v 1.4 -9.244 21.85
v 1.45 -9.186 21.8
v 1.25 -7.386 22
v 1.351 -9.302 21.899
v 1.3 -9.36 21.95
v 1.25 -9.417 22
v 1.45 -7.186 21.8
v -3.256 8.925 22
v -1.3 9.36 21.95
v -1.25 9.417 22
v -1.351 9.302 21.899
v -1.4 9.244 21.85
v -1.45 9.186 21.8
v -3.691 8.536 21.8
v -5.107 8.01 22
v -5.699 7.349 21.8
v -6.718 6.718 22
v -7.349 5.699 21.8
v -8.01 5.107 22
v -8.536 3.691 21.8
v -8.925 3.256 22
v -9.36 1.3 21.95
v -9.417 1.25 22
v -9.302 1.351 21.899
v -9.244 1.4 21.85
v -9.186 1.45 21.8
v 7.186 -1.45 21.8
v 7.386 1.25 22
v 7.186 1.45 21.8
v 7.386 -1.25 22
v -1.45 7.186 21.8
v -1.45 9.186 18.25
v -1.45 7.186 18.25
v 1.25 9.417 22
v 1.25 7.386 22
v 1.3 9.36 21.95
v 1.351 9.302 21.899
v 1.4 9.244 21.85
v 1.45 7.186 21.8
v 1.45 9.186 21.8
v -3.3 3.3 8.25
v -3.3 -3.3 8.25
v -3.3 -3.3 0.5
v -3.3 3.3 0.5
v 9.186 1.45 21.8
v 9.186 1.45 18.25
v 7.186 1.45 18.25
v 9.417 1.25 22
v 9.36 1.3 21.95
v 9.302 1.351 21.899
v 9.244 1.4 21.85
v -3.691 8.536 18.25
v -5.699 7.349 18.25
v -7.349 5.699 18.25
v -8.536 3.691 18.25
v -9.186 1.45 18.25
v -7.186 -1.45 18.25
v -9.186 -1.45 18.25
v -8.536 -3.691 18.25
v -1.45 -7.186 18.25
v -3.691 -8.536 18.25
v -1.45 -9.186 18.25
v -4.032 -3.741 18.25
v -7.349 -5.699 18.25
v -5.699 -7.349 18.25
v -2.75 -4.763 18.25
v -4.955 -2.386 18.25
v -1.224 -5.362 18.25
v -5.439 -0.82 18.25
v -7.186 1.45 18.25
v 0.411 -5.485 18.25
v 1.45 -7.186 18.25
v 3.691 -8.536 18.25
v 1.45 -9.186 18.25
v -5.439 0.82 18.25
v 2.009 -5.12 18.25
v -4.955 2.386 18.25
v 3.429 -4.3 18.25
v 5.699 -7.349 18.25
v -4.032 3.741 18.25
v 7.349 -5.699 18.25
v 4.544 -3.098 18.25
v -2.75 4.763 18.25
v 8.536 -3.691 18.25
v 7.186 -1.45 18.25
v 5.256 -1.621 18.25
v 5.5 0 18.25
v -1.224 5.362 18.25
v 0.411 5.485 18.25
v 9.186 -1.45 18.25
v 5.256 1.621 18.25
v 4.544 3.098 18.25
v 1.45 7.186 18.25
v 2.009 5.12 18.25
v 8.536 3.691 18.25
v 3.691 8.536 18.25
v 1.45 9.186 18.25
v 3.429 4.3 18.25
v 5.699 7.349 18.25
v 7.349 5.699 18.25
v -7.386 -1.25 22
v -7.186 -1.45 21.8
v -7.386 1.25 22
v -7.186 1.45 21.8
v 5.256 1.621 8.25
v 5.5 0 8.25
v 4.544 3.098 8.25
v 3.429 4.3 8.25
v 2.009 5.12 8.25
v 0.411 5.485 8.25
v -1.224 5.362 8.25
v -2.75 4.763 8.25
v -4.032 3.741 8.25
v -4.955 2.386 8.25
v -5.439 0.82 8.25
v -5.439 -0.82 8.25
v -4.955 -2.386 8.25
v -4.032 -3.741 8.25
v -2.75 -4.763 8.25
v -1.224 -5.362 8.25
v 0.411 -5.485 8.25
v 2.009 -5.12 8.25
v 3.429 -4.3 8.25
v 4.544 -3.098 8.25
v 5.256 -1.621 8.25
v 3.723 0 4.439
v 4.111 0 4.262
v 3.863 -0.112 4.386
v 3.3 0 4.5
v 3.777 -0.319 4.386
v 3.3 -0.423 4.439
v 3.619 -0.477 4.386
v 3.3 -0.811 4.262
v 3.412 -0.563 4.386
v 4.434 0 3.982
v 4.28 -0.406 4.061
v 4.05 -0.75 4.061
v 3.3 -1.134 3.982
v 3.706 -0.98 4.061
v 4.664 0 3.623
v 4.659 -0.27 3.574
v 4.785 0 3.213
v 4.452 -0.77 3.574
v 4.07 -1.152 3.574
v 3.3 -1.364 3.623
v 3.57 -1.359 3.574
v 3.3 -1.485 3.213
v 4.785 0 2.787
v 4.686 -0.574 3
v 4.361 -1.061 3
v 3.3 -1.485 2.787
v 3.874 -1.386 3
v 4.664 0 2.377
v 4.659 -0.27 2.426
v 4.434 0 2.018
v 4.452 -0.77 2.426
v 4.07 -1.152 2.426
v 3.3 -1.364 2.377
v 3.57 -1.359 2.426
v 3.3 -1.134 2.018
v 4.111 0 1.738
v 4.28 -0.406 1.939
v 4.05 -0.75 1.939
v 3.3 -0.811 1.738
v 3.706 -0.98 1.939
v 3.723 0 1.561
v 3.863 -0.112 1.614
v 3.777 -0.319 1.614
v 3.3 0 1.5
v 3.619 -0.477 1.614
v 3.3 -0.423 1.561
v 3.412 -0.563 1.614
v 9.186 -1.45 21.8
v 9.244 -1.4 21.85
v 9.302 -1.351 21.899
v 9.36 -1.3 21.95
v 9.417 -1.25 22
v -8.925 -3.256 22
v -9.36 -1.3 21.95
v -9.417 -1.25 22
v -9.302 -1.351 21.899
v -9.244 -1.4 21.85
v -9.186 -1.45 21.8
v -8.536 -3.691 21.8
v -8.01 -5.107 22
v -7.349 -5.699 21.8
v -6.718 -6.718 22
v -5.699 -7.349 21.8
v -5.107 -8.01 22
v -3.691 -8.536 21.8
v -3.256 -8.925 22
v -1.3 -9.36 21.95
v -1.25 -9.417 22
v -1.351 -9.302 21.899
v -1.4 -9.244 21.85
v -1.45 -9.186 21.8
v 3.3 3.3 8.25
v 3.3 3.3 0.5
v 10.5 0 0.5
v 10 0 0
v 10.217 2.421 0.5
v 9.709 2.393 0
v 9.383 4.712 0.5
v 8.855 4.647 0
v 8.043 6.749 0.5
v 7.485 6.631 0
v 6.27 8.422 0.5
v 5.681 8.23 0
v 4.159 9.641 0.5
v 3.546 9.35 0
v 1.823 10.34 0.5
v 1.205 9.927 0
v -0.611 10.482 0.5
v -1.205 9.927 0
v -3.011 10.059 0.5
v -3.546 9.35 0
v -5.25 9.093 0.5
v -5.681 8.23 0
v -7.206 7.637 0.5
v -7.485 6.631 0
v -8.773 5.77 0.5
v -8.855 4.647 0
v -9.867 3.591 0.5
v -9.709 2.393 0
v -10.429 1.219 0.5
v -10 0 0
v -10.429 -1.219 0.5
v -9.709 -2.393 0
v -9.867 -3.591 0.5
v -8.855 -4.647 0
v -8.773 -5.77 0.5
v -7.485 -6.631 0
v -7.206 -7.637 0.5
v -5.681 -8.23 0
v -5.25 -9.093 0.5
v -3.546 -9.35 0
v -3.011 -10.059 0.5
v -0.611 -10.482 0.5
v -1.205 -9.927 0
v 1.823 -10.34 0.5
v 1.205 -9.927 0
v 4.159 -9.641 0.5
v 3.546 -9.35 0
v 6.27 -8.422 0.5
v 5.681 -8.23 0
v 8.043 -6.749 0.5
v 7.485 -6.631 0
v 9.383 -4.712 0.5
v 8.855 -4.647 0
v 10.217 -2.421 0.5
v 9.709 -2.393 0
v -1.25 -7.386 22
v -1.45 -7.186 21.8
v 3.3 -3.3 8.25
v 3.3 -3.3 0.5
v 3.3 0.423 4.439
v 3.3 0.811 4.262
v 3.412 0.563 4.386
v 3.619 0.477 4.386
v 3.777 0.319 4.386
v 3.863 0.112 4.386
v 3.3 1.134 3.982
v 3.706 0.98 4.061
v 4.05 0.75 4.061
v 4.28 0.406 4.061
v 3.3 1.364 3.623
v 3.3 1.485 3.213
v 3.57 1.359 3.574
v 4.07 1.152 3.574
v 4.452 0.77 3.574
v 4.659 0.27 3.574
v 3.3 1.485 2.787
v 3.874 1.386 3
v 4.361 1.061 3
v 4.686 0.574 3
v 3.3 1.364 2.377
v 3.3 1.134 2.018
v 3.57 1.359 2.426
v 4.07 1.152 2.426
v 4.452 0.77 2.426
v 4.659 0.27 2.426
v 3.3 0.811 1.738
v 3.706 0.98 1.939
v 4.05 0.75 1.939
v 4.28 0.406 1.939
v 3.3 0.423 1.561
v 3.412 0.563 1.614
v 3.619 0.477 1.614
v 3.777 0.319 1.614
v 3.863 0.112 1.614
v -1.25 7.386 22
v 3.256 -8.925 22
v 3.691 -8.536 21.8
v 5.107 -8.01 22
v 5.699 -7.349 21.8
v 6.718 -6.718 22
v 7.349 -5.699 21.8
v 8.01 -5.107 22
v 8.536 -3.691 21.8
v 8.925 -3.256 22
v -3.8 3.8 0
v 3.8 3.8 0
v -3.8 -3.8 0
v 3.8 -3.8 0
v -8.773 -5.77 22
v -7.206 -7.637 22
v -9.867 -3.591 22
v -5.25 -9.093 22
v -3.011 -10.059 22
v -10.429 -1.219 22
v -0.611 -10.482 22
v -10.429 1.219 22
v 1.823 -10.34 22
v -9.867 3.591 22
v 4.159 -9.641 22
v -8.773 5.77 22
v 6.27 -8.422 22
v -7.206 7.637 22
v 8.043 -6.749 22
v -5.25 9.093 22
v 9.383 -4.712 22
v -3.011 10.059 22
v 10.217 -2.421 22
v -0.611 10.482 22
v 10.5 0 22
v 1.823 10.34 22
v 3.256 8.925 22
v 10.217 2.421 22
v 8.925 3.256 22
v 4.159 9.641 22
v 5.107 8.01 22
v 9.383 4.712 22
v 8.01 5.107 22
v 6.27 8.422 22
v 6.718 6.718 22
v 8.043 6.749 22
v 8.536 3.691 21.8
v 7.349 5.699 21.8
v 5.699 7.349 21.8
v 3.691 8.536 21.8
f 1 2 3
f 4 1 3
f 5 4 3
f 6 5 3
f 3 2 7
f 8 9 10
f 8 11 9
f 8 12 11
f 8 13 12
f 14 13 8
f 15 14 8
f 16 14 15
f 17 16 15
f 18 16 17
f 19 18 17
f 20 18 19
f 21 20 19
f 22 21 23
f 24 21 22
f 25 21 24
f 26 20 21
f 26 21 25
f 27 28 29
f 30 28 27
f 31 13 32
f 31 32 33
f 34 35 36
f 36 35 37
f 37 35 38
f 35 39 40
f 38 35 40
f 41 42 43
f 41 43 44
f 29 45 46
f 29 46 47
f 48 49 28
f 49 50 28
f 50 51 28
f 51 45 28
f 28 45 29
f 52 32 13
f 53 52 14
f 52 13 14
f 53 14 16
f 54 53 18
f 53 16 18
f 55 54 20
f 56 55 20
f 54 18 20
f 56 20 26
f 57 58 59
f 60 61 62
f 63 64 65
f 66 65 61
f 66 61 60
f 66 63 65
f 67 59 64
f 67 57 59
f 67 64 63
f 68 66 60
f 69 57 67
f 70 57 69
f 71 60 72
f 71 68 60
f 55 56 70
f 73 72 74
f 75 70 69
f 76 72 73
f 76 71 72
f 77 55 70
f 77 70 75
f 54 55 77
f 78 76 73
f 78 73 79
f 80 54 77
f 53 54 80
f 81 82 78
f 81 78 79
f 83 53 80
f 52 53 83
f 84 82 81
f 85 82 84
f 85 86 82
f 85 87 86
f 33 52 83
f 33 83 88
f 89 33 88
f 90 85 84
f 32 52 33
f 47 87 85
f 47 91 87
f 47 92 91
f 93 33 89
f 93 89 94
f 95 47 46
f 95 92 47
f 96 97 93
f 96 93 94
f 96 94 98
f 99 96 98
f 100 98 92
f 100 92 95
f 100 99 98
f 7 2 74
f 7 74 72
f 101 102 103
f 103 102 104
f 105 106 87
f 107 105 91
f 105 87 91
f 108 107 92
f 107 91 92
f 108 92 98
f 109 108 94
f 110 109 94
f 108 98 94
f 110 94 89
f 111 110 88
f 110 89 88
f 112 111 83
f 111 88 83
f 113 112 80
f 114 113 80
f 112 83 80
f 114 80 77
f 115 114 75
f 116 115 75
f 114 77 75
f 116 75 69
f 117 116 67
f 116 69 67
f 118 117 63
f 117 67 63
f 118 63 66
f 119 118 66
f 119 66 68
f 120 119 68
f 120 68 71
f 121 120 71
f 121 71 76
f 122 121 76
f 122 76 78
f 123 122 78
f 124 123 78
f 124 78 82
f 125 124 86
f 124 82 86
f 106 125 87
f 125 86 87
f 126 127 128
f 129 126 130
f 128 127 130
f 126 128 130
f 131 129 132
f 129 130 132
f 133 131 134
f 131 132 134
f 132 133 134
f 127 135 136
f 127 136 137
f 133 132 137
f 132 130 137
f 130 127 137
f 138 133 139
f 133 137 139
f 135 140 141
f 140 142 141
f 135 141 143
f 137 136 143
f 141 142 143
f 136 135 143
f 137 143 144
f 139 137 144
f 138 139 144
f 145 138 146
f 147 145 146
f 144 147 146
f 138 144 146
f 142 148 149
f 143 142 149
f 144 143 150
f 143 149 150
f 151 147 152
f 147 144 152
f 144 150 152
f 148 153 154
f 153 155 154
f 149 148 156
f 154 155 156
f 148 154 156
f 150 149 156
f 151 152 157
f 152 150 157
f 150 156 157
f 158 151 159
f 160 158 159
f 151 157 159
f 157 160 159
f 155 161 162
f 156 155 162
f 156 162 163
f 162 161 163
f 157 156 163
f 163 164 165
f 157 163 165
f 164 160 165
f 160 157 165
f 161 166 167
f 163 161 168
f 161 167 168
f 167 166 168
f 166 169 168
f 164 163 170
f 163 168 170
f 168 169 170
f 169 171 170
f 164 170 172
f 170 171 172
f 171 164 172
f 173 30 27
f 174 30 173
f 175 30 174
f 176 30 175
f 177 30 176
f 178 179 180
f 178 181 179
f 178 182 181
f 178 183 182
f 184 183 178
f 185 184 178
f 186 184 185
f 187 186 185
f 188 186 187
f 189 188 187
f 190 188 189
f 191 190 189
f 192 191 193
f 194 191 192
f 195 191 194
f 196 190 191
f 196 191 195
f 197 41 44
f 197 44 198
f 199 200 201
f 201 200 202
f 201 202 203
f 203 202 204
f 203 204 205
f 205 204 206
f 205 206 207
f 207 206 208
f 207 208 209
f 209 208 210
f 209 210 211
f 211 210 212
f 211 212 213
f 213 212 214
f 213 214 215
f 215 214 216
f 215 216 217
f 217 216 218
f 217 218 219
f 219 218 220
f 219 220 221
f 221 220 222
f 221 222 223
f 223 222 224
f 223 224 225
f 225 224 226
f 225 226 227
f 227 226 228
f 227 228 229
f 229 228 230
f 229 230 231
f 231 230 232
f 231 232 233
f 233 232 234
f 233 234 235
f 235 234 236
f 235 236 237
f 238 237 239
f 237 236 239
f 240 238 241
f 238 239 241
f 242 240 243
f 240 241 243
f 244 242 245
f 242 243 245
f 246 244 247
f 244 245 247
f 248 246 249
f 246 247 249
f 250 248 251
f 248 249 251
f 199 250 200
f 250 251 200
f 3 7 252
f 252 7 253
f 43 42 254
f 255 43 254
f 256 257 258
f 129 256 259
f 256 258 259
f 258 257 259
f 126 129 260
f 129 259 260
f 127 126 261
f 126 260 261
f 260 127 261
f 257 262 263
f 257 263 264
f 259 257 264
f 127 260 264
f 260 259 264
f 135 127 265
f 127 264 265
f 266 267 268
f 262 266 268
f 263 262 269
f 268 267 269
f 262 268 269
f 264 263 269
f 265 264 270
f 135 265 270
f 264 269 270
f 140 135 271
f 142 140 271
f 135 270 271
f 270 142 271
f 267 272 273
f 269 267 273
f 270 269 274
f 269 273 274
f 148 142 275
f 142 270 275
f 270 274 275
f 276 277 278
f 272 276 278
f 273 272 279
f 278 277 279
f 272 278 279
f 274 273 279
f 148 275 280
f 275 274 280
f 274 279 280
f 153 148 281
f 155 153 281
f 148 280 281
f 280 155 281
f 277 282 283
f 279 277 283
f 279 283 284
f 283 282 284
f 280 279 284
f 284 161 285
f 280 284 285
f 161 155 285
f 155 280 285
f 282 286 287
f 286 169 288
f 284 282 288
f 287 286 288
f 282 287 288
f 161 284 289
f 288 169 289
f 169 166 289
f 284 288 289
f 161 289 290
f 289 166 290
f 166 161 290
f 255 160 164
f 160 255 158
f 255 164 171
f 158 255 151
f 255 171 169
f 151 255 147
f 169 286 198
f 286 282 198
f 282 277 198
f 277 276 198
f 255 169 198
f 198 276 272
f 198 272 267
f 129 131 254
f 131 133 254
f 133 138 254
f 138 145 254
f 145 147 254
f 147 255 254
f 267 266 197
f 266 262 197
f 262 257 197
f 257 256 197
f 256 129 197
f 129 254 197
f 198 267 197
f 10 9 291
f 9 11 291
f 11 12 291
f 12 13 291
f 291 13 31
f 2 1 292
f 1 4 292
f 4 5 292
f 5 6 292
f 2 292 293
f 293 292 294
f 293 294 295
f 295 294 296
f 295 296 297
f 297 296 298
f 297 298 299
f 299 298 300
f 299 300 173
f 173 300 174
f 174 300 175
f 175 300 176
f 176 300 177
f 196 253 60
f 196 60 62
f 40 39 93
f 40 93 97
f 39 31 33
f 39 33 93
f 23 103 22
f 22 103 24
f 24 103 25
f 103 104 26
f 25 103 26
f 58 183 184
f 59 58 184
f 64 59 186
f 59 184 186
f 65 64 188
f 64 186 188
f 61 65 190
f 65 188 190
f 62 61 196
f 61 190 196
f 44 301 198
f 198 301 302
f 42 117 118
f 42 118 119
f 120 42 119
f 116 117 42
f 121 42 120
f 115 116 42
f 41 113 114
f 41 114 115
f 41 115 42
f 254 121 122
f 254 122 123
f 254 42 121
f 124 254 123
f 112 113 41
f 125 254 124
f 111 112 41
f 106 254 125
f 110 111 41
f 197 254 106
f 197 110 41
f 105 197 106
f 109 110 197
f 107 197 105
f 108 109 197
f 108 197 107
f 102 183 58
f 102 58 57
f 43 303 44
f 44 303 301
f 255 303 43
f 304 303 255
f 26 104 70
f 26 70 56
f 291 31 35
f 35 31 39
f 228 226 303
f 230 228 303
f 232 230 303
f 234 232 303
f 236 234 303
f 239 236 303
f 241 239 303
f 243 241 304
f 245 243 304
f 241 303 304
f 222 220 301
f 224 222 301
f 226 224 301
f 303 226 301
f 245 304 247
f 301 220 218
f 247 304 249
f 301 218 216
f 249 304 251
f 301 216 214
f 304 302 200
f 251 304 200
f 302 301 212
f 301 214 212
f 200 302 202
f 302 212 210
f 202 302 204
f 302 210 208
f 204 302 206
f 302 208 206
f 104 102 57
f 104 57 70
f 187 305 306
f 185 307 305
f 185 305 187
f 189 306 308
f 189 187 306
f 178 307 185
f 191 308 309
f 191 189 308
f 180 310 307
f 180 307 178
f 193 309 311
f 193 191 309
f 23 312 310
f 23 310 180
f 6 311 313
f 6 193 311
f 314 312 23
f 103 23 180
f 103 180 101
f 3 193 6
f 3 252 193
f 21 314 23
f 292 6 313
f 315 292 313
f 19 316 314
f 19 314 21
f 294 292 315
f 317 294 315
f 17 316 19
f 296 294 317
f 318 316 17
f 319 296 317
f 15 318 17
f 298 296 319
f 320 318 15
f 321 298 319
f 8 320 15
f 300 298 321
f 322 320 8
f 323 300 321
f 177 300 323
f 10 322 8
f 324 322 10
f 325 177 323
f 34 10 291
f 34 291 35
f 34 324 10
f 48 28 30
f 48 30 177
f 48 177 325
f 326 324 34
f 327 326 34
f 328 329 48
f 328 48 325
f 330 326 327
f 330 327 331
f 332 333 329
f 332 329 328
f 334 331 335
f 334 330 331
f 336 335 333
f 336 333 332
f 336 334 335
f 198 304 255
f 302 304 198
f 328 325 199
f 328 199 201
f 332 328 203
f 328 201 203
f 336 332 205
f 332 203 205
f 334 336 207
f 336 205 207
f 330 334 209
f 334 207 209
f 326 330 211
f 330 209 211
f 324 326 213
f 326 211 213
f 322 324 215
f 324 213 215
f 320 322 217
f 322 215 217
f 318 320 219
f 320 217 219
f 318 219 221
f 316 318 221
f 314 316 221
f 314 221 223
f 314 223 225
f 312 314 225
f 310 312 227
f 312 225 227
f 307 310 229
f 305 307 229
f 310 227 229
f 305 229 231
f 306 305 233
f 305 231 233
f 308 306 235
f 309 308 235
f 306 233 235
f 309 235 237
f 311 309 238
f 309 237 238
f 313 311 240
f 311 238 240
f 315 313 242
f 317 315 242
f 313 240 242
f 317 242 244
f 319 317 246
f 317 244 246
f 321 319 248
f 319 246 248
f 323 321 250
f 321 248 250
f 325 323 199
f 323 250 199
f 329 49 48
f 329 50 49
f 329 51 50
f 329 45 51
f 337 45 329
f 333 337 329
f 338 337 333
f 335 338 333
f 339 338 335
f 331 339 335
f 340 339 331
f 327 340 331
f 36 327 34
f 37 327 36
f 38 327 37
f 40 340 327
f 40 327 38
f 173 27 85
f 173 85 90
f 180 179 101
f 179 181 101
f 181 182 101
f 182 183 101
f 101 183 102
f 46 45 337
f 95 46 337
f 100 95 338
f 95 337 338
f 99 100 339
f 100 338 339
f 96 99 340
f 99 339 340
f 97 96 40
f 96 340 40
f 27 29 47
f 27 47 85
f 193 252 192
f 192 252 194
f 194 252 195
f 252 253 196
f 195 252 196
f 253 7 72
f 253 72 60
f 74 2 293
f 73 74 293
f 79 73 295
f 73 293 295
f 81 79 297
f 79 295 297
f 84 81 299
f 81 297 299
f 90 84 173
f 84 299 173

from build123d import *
from build123d.topology import SkipClean

# Parameters (mm, degrees)
SKETCH1_R           = 10.5
BOSS_EXTRUDE1_DEPTH = 22
SKETCH2_R           = 9.3
CUT_EXTRUDE1_DEPTH  = 3.75
BOSS_EXTRUDE3_START = 3.75
BOSS_EXTRUDE3_DEPTH = 3.75
CHAMFER1_SIZE       = 0.2
SKETCH4_W           = 6.6
SKETCH4_H           = 6.6
CUT_EXTRUDE2_DEPTH  = 24.527908959
CHAMFER2_SIZE       = 0.5
SKETCH6_R           = 5.5
CUT_EXTRUDE3_DEPTH  = 10


with BuildPart() as part:
    # Sketch1 → Boss-Extrude1 (new body)
    with BuildSketch(Plane.XY):
        Circle(SKETCH1_R)
    extrude(amount=BOSS_EXTRUDE1_DEPTH)

    # Sketch2 → Cut-Extrude1 (cut)
    with BuildSketch(Plane.XY.offset(22)):
        Circle(SKETCH2_R)
    extrude(amount=-CUT_EXTRUDE1_DEPTH, mode=Mode.SUBTRACT)

    # Sketch3 → Boss-Extrude3 (add)
    with BuildSketch(Plane.XY.offset(18.25).offset(BOSS_EXTRUDE3_START)):
        with BuildLine():
            Line((-1.45, 9.186266924), (-1.45, 7.186266924))
            Line((-1.45, 7.186266924), (1.45, 7.186266924))
            Line((1.45, 7.186266924), (1.45, 9.186266924))
            ThreePointArc((1.45, 9.186266924), (0, 9.3), (-1.45, 9.186266924))
        make_face()
        with BuildLine():
            Line((7.186266924, -1.45), (9.186266924, -1.45))
            ThreePointArc((9.186266924, -1.45), (9.3, 0), (9.186266924, 1.45))
            Line((9.186266924, 1.45), (7.186266924, 1.45))
            Line((7.186266924, 1.45), (7.186266924, -1.45))
        make_face()
        with BuildLine():
            Line((-1.45, -7.186266924), (-1.45, -9.186266924))
            ThreePointArc((-1.45, -9.186266924), (0, -9.3), (1.45, -9.186266924))
            Line((1.45, -9.186266924), (1.45, -7.186266924))
            Line((1.45, -7.186266924), (-1.45, -7.186266924))
        make_face()
        with BuildLine():
            Line((-7.186266924, 1.45), (-9.186266924, 1.45))
            ThreePointArc((-9.186266924, 1.45), (-9.3, 0), (-9.186266924, -1.45))
            Line((-9.186266924, -1.45), (-7.186266924, -1.45))
            Line((-7.186266924, -1.45), (-7.186266924, 1.45))
        make_face()
    extrude(amount=-BOSS_EXTRUDE3_DEPTH)

    # Chamfer1
    chamfer1_edges = [part.edges().sort_by_distance(p)[0] for p in [
        (-6.576093065, 6.576093065, 22),
        (1.45, 8.186266924, 22),
        (-1.45, 8.186266924, 22),
        (0, 7.186266924, 22),
        (6.576093065, 6.576093065, 22),
        (8.186266924, -1.45, 22),
        (8.186266924, 1.45, 22),
        (7.186266924, 0, 22),
        (6.576093065, -6.576093065, 22),
        (-1.45, -8.186266924, 22),
        (1.45, -8.186266924, 22),
        (0, -7.186266924, 22),
        (-6.576093065, -6.576093065, 22),
        (-8.186266924, 1.45, 22),
        (-8.186266924, -1.45, 22),
        (-7.186266924, 0, 22),
    ]]
    chamfer(chamfer1_edges, length=CHAMFER1_SIZE)

    # Sketch4 → Cut-Extrude2 (cut, through all)
    with BuildSketch(Plane.XY.offset(18.25)):
        Rectangle(SKETCH4_W, SKETCH4_H)
    extrude(amount=-CUT_EXTRUDE2_DEPTH, mode=Mode.SUBTRACT)

    # Chamfer2
    chamfer2_edges = [part.edges().sort_by_distance(p)[0] for p in [
        (3.3, 0, 0),
        (0, -3.3, 0),
        (-3.3, 0, 0),
        (0, 3.3, 0),
        (-10.5, 0, 0),
    ]]
    chamfer(chamfer2_edges, length=CHAMFER2_SIZE)

    # Sketch5 → Cut-Revolve1 (revolve, cut)
    with SkipClean():  # the faces are left unmerged after this step: merging them gives an invalid solid
        with BuildSketch(Plane(origin=(0, 0, 0), x_dir=(1, 0, 0), z_dir=(0, 1, 0))):
            with BuildLine():
                Line((3.3, -1.5), (3.3, -4.5))
                ThreePointArc((3.3, -4.5), (4.8, -3), (3.3, -1.5))
            make_face()
        revolve(axis=Axis((3.3, 0, 6.635415663), (0, 0, -1)), mode=Mode.SUBTRACT)

    # Sketch6 → Cut-Extrude3 (cut)
    with SkipClean():  # the faces are left unmerged after this step: merging them gives an invalid solid
        with BuildSketch(Plane.XY.offset(18.25)):
            Circle(SKETCH6_R)
        extrude(amount=-CUT_EXTRUDE3_DEPTH, mode=Mode.SUBTRACT)


solid = part.part
